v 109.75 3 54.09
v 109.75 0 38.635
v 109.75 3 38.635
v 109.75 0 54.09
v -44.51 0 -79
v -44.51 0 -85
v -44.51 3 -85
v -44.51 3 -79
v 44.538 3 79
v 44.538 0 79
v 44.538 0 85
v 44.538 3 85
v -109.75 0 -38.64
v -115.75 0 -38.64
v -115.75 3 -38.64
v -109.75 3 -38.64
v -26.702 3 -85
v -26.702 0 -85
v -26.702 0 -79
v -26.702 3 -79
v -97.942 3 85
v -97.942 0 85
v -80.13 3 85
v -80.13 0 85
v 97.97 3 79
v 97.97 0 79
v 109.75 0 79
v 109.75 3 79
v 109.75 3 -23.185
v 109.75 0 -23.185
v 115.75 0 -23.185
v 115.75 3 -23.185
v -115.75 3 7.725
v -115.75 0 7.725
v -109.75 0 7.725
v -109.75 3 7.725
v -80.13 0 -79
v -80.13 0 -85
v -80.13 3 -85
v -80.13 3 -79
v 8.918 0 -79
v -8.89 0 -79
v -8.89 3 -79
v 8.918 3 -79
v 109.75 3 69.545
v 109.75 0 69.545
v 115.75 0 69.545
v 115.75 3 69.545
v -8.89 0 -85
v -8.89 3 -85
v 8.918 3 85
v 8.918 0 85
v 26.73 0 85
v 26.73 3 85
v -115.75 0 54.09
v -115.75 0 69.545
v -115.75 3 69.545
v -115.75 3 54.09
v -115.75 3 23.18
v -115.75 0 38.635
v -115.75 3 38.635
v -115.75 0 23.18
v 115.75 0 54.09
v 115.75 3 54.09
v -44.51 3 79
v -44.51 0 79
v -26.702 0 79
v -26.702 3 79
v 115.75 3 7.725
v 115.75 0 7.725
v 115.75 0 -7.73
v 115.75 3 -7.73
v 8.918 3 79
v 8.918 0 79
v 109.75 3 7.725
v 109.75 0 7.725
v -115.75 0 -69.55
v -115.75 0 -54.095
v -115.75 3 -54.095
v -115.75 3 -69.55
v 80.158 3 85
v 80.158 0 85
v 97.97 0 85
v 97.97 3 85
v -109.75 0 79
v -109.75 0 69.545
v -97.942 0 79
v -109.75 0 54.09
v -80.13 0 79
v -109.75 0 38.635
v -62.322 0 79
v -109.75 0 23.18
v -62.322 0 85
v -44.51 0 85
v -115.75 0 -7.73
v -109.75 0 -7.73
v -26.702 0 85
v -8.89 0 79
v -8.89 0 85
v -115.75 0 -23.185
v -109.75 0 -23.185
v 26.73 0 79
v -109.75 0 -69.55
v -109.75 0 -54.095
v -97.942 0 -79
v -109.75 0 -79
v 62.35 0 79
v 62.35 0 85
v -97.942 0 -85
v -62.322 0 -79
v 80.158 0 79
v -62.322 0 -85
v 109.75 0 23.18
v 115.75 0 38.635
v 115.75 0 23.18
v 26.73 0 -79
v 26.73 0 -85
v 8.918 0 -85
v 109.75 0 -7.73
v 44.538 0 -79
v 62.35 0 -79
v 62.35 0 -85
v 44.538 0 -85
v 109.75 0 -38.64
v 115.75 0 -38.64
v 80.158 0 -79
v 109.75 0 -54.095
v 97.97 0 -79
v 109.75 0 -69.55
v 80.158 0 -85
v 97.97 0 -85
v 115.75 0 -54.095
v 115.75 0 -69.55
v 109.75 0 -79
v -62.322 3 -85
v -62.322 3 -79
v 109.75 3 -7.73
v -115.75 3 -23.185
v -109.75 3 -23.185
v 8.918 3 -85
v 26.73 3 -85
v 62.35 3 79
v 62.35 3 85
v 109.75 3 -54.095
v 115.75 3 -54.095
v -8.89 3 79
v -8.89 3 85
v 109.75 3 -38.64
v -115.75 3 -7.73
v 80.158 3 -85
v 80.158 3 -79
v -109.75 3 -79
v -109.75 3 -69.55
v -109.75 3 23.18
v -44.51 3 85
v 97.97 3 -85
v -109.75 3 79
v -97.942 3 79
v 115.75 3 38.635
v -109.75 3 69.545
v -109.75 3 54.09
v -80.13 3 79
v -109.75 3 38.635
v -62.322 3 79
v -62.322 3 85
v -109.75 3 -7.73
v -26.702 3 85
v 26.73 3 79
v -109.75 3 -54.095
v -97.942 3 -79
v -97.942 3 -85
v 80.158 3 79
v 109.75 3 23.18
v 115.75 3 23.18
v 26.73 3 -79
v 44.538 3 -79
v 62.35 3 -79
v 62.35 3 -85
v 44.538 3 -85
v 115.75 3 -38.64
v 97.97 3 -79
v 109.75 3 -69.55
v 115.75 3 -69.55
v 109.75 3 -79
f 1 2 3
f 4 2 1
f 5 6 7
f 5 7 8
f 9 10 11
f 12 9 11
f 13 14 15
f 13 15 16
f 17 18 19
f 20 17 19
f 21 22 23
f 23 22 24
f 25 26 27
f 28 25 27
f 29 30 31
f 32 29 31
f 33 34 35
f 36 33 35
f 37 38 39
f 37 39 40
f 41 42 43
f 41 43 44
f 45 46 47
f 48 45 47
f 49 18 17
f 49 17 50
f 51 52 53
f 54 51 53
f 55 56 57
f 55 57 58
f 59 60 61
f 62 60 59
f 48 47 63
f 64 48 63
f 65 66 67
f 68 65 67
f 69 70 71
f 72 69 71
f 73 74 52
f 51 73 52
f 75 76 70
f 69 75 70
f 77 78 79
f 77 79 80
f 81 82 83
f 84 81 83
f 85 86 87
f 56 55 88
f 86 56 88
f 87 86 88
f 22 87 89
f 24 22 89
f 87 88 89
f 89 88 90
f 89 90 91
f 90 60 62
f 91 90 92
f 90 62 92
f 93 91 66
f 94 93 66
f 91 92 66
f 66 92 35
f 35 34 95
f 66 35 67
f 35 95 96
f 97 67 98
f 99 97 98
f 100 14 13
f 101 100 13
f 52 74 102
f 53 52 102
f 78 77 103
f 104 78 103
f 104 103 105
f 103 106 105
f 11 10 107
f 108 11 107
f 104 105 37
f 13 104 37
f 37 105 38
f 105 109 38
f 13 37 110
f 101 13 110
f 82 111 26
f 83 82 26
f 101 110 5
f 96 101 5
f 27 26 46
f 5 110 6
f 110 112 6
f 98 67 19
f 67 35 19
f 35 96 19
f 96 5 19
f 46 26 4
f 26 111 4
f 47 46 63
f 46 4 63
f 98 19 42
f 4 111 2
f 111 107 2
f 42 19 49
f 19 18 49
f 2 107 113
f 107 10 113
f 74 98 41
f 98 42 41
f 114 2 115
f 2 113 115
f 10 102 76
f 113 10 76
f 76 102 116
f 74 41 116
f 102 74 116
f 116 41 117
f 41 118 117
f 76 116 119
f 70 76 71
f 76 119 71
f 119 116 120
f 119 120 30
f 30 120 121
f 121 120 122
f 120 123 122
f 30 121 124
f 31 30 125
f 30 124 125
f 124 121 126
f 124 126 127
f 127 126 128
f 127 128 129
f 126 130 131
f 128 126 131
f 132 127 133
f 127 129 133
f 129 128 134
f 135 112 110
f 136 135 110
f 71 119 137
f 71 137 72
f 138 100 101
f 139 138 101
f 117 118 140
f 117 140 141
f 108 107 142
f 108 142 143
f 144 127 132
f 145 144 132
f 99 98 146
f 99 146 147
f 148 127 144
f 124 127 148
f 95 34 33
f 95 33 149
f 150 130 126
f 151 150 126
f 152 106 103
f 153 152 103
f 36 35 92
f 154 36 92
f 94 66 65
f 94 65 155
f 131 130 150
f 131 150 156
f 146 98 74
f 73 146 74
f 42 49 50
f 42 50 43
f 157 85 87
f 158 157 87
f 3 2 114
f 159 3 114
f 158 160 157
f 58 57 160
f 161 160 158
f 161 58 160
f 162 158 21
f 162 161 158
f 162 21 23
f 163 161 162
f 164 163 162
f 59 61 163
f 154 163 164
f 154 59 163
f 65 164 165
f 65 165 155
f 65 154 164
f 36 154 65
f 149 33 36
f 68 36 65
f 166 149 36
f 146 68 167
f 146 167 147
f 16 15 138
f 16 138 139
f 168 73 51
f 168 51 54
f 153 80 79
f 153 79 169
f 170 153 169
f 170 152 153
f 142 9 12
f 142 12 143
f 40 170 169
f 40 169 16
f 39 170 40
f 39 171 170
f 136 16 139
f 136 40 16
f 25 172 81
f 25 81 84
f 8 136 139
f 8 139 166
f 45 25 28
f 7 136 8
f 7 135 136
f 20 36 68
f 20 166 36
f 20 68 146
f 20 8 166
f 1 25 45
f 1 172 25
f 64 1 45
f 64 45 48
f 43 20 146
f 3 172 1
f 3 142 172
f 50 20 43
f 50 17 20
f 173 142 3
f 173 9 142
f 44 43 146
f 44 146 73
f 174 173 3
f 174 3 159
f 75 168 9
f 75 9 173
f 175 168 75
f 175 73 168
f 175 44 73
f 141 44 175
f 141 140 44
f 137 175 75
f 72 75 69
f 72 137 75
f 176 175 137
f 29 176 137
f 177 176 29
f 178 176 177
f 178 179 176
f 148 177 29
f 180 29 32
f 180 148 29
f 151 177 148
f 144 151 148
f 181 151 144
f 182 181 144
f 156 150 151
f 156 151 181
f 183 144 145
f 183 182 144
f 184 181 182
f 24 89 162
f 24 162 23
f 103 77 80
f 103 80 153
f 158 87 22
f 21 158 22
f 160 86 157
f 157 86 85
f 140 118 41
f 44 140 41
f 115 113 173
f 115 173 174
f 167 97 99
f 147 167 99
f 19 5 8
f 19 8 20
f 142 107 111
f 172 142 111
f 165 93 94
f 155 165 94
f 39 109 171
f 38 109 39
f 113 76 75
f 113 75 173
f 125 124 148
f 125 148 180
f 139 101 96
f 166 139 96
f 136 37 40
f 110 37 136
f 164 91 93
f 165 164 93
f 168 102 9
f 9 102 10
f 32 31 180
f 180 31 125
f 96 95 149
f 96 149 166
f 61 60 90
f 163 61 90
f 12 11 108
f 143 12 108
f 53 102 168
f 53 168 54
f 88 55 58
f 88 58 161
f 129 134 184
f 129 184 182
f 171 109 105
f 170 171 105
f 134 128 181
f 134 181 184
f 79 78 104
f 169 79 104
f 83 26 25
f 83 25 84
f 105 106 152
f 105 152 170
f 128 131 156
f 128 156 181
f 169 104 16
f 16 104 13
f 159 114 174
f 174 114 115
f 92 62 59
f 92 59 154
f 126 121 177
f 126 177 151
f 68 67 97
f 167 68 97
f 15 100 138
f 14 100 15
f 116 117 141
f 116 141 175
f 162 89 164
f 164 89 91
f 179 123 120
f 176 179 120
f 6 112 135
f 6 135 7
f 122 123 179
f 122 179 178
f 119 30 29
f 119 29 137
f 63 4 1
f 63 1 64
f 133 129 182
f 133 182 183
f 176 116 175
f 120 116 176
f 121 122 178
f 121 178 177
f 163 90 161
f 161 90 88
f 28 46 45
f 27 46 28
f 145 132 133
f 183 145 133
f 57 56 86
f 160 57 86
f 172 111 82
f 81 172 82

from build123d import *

# Parameters (mm, degrees)
ESBO_O1_W                = 231.5
ESBO_O1_H                = 170
RESSALTO_EXTRUS_O1_DEPTH = 3
CORTE_EXTRUS_O1_REACH    = 145.639
ESBO_O2_W                = 17.807692308
ESBO_O2_H                = 6
CORTE_EXTRUS_O2_REACH    = 145.639
ESBO_O3_W                = 6
ESBO_O3_H                = 15.454545455


with BuildPart() as part:
    # Esboço1 → Ressalto-extrusão1 (new body)
    with BuildSketch(Plane(origin=(0, 0, 0), x_dir=(1, 0, 0), z_dir=(0, 1, 0))):
        Rectangle(ESBO_O1_W, ESBO_O1_H)
    extrude(amount=RESSALTO_EXTRUS_O1_DEPTH)

    # Esboço2 → Corte-extrusão1 (cut, up to next)
    with BuildSketch(Plane.XZ, mode=Mode.PRIVATE) as corte_extrus_o1_sk1:
        with Locations((-71.226153846, 82)):
            Rectangle(ESBO_O2_W, ESBO_O2_H)
    corte_extrus_o1_tool1 = extrude(corte_extrus_o1_sk1.sketch, amount=-CORTE_EXTRUS_O1_REACH, mode=Mode.PRIVATE) & part.part
    # Esboço2 → Corte-extrusão1 (cut, up to next)
    with BuildSketch(Plane.XZ, mode=Mode.PRIVATE) as corte_extrus_o1_sk2:
        with Locations((-106.846153846, 82)):
            Rectangle(ESBO_O2_W, ESBO_O2_H)
    corte_extrus_o1_tool2 = extrude(corte_extrus_o1_sk2.sketch, amount=-CORTE_EXTRUS_O1_REACH, mode=Mode.PRIVATE) & part.part
    # Esboço2 → Corte-extrusão1 (cut, up to next)
    with BuildSketch(Plane.XZ, mode=Mode.PRIVATE) as corte_extrus_o1_sk3:
        with Locations((-35.606153846, 82)):
            Rectangle(ESBO_O2_W, ESBO_O2_H)
    corte_extrus_o1_tool3 = extrude(corte_extrus_o1_sk3.sketch, amount=-CORTE_EXTRUS_O1_REACH, mode=Mode.PRIVATE) & part.part
    # Esboço2 → Corte-extrusão1 (cut, up to next)
    with BuildSketch(Plane.XZ, mode=Mode.PRIVATE) as corte_extrus_o1_sk4:
        with Locations((0.013846154, 82)):
            Rectangle(ESBO_O2_W, ESBO_O2_H)
    corte_extrus_o1_tool4 = extrude(corte_extrus_o1_sk4.sketch, amount=-CORTE_EXTRUS_O1_REACH, mode=Mode.PRIVATE) & part.part
    # Esboço2 → Corte-extrusão1 (cut, up to next)
    with BuildSketch(Plane.XZ, mode=Mode.PRIVATE) as corte_extrus_o1_sk5:
        with Locations((35.633846154, 82)):
            Rectangle(ESBO_O2_W, ESBO_O2_H)
    corte_extrus_o1_tool5 = extrude(corte_extrus_o1_sk5.sketch, amount=-CORTE_EXTRUS_O1_REACH, mode=Mode.PRIVATE) & part.part
    # Esboço2 → Corte-extrusão1 (cut, up to next)
    with BuildSketch(Plane.XZ, mode=Mode.PRIVATE) as corte_extrus_o1_sk6:
        with Locations((71.253846154, 82)):
            Rectangle(ESBO_O2_W, ESBO_O2_H)
    corte_extrus_o1_tool6 = extrude(corte_extrus_o1_sk6.sketch, amount=-CORTE_EXTRUS_O1_REACH, mode=Mode.PRIVATE) & part.part
    # Esboço2 → Corte-extrusão1 (cut, up to next)
    with BuildSketch(Plane.XZ, mode=Mode.PRIVATE) as corte_extrus_o1_sk7:
        with Locations((106.873846154, 82)):
            Rectangle(ESBO_O2_W, ESBO_O2_H)
    corte_extrus_o1_tool7 = extrude(corte_extrus_o1_sk7.sketch, amount=-CORTE_EXTRUS_O1_REACH, mode=Mode.PRIVATE) & part.part
    # Esboço2 → Corte-extrusão1 (cut, up to next)
    with BuildSketch(Plane.XZ, mode=Mode.PRIVATE) as corte_extrus_o1_sk8:
        with Locations((-71.226153846, -82)):
            Rectangle(ESBO_O2_W, ESBO_O2_H)
    corte_extrus_o1_tool8 = extrude(corte_extrus_o1_sk8.sketch, amount=-CORTE_EXTRUS_O1_REACH, mode=Mode.PRIVATE) & part.part
    # Esboço2 → Corte-extrusão1 (cut, up to next)
    with BuildSketch(Plane.XZ, mode=Mode.PRIVATE) as corte_extrus_o1_sk9:
        with Locations((-35.606153846, -82)):
            Rectangle(ESBO_O2_W, ESBO_O2_H)
    corte_extrus_o1_tool9 = extrude(corte_extrus_o1_sk9.sketch, amount=-CORTE_EXTRUS_O1_REACH, mode=Mode.PRIVATE) & part.part
    # Esboço2 → Corte-extrusão1 (cut, up to next)
    with BuildSketch(Plane.XZ, mode=Mode.PRIVATE) as corte_extrus_o1_sk10:
        with Locations((0.013846154, -82)):
            Rectangle(ESBO_O2_W, ESBO_O2_H)
    corte_extrus_o1_tool10 = extrude(corte_extrus_o1_sk10.sketch, amount=-CORTE_EXTRUS_O1_REACH, mode=Mode.PRIVATE) & part.part
    # Esboço2 → Corte-extrusão1 (cut, up to next)
    with BuildSketch(Plane.XZ, mode=Mode.PRIVATE) as corte_extrus_o1_sk11:
        with Locations((35.633846154, -82)):
            Rectangle(ESBO_O2_W, ESBO_O2_H)
    corte_extrus_o1_tool11 = extrude(corte_extrus_o1_sk11.sketch, amount=-CORTE_EXTRUS_O1_REACH, mode=Mode.PRIVATE) & part.part
    # Esboço2 → Corte-extrusão1 (cut, up to next)
    with BuildSketch(Plane.XZ, mode=Mode.PRIVATE) as corte_extrus_o1_sk12:
        with Locations((71.253846154, -82)):
            Rectangle(ESBO_O2_W, ESBO_O2_H)
    corte_extrus_o1_tool12 = extrude(corte_extrus_o1_sk12.sketch, amount=-CORTE_EXTRUS_O1_REACH, mode=Mode.PRIVATE) & part.part
    # Esboço2 → Corte-extrusão1 (cut, up to next)
    with BuildSketch(Plane.XZ, mode=Mode.PRIVATE) as corte_extrus_o1_sk13:
        with Locations((106.873846154, -82)):
            Rectangle(ESBO_O2_W, ESBO_O2_H)
    corte_extrus_o1_tool13 = extrude(corte_extrus_o1_sk13.sketch, amount=-CORTE_EXTRUS_O1_REACH, mode=Mode.PRIVATE) & part.part
    # Esboço2 → Corte-extrusão1 (cut, up to next)
    with BuildSketch(Plane.XZ, mode=Mode.PRIVATE) as corte_extrus_o1_sk14:
        with Locations((-106.846153846, -82)):
            Rectangle(ESBO_O2_W, ESBO_O2_H)
    corte_extrus_o1_tool14 = extrude(corte_extrus_o1_sk14.sketch, amount=-CORTE_EXTRUS_O1_REACH, mode=Mode.PRIVATE) & part.part
    add(corte_extrus_o1_tool1.solids().sort_by_distance((-71.226154, 0, 82))[0], mode=Mode.SUBTRACT)
    add(corte_extrus_o1_tool2.solids().sort_by_distance((-106.846154, 0, 82))[0], mode=Mode.SUBTRACT)
    add(corte_extrus_o1_tool3.solids().sort_by_distance((-35.606154, 0, 82))[0], mode=Mode.SUBTRACT)
    add(corte_extrus_o1_tool4.solids().sort_by_distance((0.013846, 0, 82))[0], mode=Mode.SUBTRACT)
    add(corte_extrus_o1_tool5.solids().sort_by_distance((35.633846, 0, 82))[0], mode=Mode.SUBTRACT)
    add(corte_extrus_o1_tool6.solids().sort_by_distance((71.253846, 0, 82))[0], mode=Mode.SUBTRACT)
    add(corte_extrus_o1_tool7.solids().sort_by_distance((106.873846, 0, 82))[0], mode=Mode.SUBTRACT)
    add(corte_extrus_o1_tool8.solids().sort_by_distance((-71.226154, 0, -82))[0], mode=Mode.SUBTRACT)
    add(corte_extrus_o1_tool9.solids().sort_by_distance((-35.606154, 0, -82))[0], mode=Mode.SUBTRACT)
    add(corte_extrus_o1_tool10.solids().sort_by_distance((0.013846, 0, -82))[0], mode=Mode.SUBTRACT)
    add(corte_extrus_o1_tool11.solids().sort_by_distance((35.633846, 0, -82))[0], mode=Mode.SUBTRACT)
    add(corte_extrus_o1_tool12.solids().sort_by_distance((71.253846, 0, -82))[0], mode=Mode.SUBTRACT)
    add(corte_extrus_o1_tool13.solids().sort_by_distance((106.873846, 0, -82))[0], mode=Mode.SUBTRACT)
    add(corte_extrus_o1_tool14.solids().sort_by_distance((-106.846154, 0, -82))[0], mode=Mode.SUBTRACT)

    # Esboço3 → Corte-extrusão2 (cut, up to next)
    with BuildSketch(Plane.XZ, mode=Mode.PRIVATE) as corte_extrus_o2_sk1:
        with Locations((112.75, 77.272727272)):
            Rectangle(ESBO_O3_W, ESBO_O3_H)
    corte_extrus_o2_tool1 = extrude(corte_extrus_o2_sk1.sketch, amount=-CORTE_EXTRUS_O2_REACH, mode=Mode.PRIVATE) & part.part
    # Esboço3 → Corte-extrusão2 (cut, up to next)
    with BuildSketch(Plane.XZ, mode=Mode.PRIVATE) as corte_extrus_o2_sk2:
        with Locations((-112.75, 77.272727272)):
            Rectangle(ESBO_O3_W, ESBO_O3_H)
    corte_extrus_o2_tool2 = extrude(corte_extrus_o2_sk2.sketch, amount=-CORTE_EXTRUS_O2_REACH, mode=Mode.PRIVATE) & part.part
    # Esboço3 → Corte-extrusão2 (cut, up to next)
    with BuildSketch(Plane.XZ, mode=Mode.PRIVATE) as corte_extrus_o2_sk3:
        with Locations((112.75, 46.362727273)):
            Rectangle(ESBO_O3_W, ESBO_O3_H)
    corte_extrus_o2_tool3 = extrude(corte_extrus_o2_sk3.sketch, amount=-CORTE_EXTRUS_O2_REACH, mode=Mode.PRIVATE) & part.part
    # Esboço3 → Corte-extrusão2 (cut, up to next)
    with BuildSketch(Plane.XZ, mode=Mode.PRIVATE) as corte_extrus_o2_sk4:
        with Locations((112.75, 15.452727273)):
            Rectangle(ESBO_O3_W, ESBO_O3_H)
    corte_extrus_o2_tool4 = extrude(corte_extrus_o2_sk4.sketch, amount=-CORTE_EXTRUS_O2_REACH, mode=Mode.PRIVATE) & part.part
    # Esboço3 → Corte-extrusão2 (cut, up to next)
    with BuildSketch(Plane.XZ, mode=Mode.PRIVATE) as corte_extrus_o2_sk5:
        with Locations((112.75, -15.457272728)):
            Rectangle(ESBO_O3_W, ESBO_O3_H)
    corte_extrus_o2_tool5 = extrude(corte_extrus_o2_sk5.sketch, amount=-CORTE_EXTRUS_O2_REACH, mode=Mode.PRIVATE) & part.part
    # Esboço3 → Corte-extrusão2 (cut, up to next)
    with BuildSketch(Plane.XZ, mode=Mode.PRIVATE) as corte_extrus_o2_sk6:
        with Locations((112.75, -46.367272728)):
            Rectangle(ESBO_O3_W, ESBO_O3_H)
    corte_extrus_o2_tool6 = extrude(corte_extrus_o2_sk6.sketch, amount=-CORTE_EXTRUS_O2_REACH, mode=Mode.PRIVATE) & part.part
    # Esboço3 → Corte-extrusão2 (cut, up to next)
    with BuildSketch(Plane.XZ, mode=Mode.PRIVATE) as corte_extrus_o2_sk7:
        with Locations((112.75, -77.277272728)):
            Rectangle(ESBO_O3_W, ESBO_O3_H)
    corte_extrus_o2_tool7 = extrude(corte_extrus_o2_sk7.sketch, amount=-CORTE_EXTRUS_O2_REACH, mode=Mode.PRIVATE) & part.part
    # Esboço3 → Corte-extrusão2 (cut, up to next)
    with BuildSketch(Plane.XZ, mode=Mode.PRIVATE) as corte_extrus_o2_sk8:
        with Locations((-112.75, 46.362727273)):
            Rectangle(ESBO_O3_W, ESBO_O3_H)
    corte_extrus_o2_tool8 = extrude(corte_extrus_o2_sk8.sketch, amount=-CORTE_EXTRUS_O2_REACH, mode=Mode.PRIVATE) & part.part
    # Esboço3 → Corte-extrusão2 (cut, up to next)
    with BuildSketch(Plane.XZ, mode=Mode.PRIVATE) as corte_extrus_o2_sk9:
        with Locations((-112.75, 15.452727273)):
            Rectangle(ESBO_O3_W, ESBO_O3_H)
    corte_extrus_o2_tool9 = extrude(corte_extrus_o2_sk9.sketch, amount=-CORTE_EXTRUS_O2_REACH, mode=Mode.PRIVATE) & part.part
    # Esboço3 → Corte-extrusão2 (cut, up to next)
    with BuildSketch(Plane.XZ, mode=Mode.PRIVATE) as corte_extrus_o2_sk10:
        with Locations((-112.75, -15.457272728)):
            Rectangle(ESBO_O3_W, ESBO_O3_H)
    corte_extrus_o2_tool10 = extrude(corte_extrus_o2_sk10.sketch, amount=-CORTE_EXTRUS_O2_REACH, mode=Mode.PRIVATE) & part.part
    # Esboço3 → Corte-extrusão2 (cut, up to next)
    with BuildSketch(Plane.XZ, mode=Mode.PRIVATE) as corte_extrus_o2_sk11:
        with Locations((-112.75, -46.367272728)):
            Rectangle(ESBO_O3_W, ESBO_O3_H)
    corte_extrus_o2_tool11 = extrude(corte_extrus_o2_sk11.sketch, amount=-CORTE_EXTRUS_O2_REACH, mode=Mode.PRIVATE) & part.part
    # Esboço3 → Corte-extrusão2 (cut, up to next)
    with BuildSketch(Plane.XZ, mode=Mode.PRIVATE) as corte_extrus_o2_sk12:
        with Locations((-112.75, -77.277272728)):
            Rectangle(ESBO_O3_W, ESBO_O3_H)
    corte_extrus_o2_tool12 = extrude(corte_extrus_o2_sk12.sketch, amount=-CORTE_EXTRUS_O2_REACH, mode=Mode.PRIVATE) & part.part
    add(corte_extrus_o2_tool1.solids().sort_by_distance((112.75, 0, 77.272727))[0], mode=Mode.SUBTRACT)
    add(corte_extrus_o2_tool2.solids().sort_by_distance((-112.75, 0, 77.272727))[0], mode=Mode.SUBTRACT)
    add(corte_extrus_o2_tool3.solids().sort_by_distance((112.75, 0, 46.362727))[0], mode=Mode.SUBTRACT)
    add(corte_extrus_o2_tool4.solids().sort_by_distance((112.75, 0, 15.452727))[0], mode=Mode.SUBTRACT)
    add(corte_extrus_o2_tool5.solids().sort_by_distance((112.75, 0, -15.457273))[0], mode=Mode.SUBTRACT)
    add(corte_extrus_o2_tool6.solids().sort_by_distance((112.75, 0, -46.367273))[0], mode=Mode.SUBTRACT)
    add(corte_extrus_o2_tool7.solids().sort_by_distance((112.75, 0, -77.277273))[0], mode=Mode.SUBTRACT)
    add(corte_extrus_o2_tool8.solids().sort_by_distance((-112.75, 0, 46.362727))[0], mode=Mode.SUBTRACT)
    add(corte_extrus_o2_tool9.solids().sort_by_distance((-112.75, 0, 15.452727))[0], mode=Mode.SUBTRACT)
    add(corte_extrus_o2_tool10.solids().sort_by_distance((-112.75, 0, -15.457273))[0], mode=Mode.SUBTRACT)
    add(corte_extrus_o2_tool11.solids().sort_by_distance((-112.75, 0, -46.367273))[0], mode=Mode.SUBTRACT)
    add(corte_extrus_o2_tool12.solids().sort_by_distance((-112.75, 0, -77.277273))[0], mode=Mode.SUBTRACT)


solid = part.part
